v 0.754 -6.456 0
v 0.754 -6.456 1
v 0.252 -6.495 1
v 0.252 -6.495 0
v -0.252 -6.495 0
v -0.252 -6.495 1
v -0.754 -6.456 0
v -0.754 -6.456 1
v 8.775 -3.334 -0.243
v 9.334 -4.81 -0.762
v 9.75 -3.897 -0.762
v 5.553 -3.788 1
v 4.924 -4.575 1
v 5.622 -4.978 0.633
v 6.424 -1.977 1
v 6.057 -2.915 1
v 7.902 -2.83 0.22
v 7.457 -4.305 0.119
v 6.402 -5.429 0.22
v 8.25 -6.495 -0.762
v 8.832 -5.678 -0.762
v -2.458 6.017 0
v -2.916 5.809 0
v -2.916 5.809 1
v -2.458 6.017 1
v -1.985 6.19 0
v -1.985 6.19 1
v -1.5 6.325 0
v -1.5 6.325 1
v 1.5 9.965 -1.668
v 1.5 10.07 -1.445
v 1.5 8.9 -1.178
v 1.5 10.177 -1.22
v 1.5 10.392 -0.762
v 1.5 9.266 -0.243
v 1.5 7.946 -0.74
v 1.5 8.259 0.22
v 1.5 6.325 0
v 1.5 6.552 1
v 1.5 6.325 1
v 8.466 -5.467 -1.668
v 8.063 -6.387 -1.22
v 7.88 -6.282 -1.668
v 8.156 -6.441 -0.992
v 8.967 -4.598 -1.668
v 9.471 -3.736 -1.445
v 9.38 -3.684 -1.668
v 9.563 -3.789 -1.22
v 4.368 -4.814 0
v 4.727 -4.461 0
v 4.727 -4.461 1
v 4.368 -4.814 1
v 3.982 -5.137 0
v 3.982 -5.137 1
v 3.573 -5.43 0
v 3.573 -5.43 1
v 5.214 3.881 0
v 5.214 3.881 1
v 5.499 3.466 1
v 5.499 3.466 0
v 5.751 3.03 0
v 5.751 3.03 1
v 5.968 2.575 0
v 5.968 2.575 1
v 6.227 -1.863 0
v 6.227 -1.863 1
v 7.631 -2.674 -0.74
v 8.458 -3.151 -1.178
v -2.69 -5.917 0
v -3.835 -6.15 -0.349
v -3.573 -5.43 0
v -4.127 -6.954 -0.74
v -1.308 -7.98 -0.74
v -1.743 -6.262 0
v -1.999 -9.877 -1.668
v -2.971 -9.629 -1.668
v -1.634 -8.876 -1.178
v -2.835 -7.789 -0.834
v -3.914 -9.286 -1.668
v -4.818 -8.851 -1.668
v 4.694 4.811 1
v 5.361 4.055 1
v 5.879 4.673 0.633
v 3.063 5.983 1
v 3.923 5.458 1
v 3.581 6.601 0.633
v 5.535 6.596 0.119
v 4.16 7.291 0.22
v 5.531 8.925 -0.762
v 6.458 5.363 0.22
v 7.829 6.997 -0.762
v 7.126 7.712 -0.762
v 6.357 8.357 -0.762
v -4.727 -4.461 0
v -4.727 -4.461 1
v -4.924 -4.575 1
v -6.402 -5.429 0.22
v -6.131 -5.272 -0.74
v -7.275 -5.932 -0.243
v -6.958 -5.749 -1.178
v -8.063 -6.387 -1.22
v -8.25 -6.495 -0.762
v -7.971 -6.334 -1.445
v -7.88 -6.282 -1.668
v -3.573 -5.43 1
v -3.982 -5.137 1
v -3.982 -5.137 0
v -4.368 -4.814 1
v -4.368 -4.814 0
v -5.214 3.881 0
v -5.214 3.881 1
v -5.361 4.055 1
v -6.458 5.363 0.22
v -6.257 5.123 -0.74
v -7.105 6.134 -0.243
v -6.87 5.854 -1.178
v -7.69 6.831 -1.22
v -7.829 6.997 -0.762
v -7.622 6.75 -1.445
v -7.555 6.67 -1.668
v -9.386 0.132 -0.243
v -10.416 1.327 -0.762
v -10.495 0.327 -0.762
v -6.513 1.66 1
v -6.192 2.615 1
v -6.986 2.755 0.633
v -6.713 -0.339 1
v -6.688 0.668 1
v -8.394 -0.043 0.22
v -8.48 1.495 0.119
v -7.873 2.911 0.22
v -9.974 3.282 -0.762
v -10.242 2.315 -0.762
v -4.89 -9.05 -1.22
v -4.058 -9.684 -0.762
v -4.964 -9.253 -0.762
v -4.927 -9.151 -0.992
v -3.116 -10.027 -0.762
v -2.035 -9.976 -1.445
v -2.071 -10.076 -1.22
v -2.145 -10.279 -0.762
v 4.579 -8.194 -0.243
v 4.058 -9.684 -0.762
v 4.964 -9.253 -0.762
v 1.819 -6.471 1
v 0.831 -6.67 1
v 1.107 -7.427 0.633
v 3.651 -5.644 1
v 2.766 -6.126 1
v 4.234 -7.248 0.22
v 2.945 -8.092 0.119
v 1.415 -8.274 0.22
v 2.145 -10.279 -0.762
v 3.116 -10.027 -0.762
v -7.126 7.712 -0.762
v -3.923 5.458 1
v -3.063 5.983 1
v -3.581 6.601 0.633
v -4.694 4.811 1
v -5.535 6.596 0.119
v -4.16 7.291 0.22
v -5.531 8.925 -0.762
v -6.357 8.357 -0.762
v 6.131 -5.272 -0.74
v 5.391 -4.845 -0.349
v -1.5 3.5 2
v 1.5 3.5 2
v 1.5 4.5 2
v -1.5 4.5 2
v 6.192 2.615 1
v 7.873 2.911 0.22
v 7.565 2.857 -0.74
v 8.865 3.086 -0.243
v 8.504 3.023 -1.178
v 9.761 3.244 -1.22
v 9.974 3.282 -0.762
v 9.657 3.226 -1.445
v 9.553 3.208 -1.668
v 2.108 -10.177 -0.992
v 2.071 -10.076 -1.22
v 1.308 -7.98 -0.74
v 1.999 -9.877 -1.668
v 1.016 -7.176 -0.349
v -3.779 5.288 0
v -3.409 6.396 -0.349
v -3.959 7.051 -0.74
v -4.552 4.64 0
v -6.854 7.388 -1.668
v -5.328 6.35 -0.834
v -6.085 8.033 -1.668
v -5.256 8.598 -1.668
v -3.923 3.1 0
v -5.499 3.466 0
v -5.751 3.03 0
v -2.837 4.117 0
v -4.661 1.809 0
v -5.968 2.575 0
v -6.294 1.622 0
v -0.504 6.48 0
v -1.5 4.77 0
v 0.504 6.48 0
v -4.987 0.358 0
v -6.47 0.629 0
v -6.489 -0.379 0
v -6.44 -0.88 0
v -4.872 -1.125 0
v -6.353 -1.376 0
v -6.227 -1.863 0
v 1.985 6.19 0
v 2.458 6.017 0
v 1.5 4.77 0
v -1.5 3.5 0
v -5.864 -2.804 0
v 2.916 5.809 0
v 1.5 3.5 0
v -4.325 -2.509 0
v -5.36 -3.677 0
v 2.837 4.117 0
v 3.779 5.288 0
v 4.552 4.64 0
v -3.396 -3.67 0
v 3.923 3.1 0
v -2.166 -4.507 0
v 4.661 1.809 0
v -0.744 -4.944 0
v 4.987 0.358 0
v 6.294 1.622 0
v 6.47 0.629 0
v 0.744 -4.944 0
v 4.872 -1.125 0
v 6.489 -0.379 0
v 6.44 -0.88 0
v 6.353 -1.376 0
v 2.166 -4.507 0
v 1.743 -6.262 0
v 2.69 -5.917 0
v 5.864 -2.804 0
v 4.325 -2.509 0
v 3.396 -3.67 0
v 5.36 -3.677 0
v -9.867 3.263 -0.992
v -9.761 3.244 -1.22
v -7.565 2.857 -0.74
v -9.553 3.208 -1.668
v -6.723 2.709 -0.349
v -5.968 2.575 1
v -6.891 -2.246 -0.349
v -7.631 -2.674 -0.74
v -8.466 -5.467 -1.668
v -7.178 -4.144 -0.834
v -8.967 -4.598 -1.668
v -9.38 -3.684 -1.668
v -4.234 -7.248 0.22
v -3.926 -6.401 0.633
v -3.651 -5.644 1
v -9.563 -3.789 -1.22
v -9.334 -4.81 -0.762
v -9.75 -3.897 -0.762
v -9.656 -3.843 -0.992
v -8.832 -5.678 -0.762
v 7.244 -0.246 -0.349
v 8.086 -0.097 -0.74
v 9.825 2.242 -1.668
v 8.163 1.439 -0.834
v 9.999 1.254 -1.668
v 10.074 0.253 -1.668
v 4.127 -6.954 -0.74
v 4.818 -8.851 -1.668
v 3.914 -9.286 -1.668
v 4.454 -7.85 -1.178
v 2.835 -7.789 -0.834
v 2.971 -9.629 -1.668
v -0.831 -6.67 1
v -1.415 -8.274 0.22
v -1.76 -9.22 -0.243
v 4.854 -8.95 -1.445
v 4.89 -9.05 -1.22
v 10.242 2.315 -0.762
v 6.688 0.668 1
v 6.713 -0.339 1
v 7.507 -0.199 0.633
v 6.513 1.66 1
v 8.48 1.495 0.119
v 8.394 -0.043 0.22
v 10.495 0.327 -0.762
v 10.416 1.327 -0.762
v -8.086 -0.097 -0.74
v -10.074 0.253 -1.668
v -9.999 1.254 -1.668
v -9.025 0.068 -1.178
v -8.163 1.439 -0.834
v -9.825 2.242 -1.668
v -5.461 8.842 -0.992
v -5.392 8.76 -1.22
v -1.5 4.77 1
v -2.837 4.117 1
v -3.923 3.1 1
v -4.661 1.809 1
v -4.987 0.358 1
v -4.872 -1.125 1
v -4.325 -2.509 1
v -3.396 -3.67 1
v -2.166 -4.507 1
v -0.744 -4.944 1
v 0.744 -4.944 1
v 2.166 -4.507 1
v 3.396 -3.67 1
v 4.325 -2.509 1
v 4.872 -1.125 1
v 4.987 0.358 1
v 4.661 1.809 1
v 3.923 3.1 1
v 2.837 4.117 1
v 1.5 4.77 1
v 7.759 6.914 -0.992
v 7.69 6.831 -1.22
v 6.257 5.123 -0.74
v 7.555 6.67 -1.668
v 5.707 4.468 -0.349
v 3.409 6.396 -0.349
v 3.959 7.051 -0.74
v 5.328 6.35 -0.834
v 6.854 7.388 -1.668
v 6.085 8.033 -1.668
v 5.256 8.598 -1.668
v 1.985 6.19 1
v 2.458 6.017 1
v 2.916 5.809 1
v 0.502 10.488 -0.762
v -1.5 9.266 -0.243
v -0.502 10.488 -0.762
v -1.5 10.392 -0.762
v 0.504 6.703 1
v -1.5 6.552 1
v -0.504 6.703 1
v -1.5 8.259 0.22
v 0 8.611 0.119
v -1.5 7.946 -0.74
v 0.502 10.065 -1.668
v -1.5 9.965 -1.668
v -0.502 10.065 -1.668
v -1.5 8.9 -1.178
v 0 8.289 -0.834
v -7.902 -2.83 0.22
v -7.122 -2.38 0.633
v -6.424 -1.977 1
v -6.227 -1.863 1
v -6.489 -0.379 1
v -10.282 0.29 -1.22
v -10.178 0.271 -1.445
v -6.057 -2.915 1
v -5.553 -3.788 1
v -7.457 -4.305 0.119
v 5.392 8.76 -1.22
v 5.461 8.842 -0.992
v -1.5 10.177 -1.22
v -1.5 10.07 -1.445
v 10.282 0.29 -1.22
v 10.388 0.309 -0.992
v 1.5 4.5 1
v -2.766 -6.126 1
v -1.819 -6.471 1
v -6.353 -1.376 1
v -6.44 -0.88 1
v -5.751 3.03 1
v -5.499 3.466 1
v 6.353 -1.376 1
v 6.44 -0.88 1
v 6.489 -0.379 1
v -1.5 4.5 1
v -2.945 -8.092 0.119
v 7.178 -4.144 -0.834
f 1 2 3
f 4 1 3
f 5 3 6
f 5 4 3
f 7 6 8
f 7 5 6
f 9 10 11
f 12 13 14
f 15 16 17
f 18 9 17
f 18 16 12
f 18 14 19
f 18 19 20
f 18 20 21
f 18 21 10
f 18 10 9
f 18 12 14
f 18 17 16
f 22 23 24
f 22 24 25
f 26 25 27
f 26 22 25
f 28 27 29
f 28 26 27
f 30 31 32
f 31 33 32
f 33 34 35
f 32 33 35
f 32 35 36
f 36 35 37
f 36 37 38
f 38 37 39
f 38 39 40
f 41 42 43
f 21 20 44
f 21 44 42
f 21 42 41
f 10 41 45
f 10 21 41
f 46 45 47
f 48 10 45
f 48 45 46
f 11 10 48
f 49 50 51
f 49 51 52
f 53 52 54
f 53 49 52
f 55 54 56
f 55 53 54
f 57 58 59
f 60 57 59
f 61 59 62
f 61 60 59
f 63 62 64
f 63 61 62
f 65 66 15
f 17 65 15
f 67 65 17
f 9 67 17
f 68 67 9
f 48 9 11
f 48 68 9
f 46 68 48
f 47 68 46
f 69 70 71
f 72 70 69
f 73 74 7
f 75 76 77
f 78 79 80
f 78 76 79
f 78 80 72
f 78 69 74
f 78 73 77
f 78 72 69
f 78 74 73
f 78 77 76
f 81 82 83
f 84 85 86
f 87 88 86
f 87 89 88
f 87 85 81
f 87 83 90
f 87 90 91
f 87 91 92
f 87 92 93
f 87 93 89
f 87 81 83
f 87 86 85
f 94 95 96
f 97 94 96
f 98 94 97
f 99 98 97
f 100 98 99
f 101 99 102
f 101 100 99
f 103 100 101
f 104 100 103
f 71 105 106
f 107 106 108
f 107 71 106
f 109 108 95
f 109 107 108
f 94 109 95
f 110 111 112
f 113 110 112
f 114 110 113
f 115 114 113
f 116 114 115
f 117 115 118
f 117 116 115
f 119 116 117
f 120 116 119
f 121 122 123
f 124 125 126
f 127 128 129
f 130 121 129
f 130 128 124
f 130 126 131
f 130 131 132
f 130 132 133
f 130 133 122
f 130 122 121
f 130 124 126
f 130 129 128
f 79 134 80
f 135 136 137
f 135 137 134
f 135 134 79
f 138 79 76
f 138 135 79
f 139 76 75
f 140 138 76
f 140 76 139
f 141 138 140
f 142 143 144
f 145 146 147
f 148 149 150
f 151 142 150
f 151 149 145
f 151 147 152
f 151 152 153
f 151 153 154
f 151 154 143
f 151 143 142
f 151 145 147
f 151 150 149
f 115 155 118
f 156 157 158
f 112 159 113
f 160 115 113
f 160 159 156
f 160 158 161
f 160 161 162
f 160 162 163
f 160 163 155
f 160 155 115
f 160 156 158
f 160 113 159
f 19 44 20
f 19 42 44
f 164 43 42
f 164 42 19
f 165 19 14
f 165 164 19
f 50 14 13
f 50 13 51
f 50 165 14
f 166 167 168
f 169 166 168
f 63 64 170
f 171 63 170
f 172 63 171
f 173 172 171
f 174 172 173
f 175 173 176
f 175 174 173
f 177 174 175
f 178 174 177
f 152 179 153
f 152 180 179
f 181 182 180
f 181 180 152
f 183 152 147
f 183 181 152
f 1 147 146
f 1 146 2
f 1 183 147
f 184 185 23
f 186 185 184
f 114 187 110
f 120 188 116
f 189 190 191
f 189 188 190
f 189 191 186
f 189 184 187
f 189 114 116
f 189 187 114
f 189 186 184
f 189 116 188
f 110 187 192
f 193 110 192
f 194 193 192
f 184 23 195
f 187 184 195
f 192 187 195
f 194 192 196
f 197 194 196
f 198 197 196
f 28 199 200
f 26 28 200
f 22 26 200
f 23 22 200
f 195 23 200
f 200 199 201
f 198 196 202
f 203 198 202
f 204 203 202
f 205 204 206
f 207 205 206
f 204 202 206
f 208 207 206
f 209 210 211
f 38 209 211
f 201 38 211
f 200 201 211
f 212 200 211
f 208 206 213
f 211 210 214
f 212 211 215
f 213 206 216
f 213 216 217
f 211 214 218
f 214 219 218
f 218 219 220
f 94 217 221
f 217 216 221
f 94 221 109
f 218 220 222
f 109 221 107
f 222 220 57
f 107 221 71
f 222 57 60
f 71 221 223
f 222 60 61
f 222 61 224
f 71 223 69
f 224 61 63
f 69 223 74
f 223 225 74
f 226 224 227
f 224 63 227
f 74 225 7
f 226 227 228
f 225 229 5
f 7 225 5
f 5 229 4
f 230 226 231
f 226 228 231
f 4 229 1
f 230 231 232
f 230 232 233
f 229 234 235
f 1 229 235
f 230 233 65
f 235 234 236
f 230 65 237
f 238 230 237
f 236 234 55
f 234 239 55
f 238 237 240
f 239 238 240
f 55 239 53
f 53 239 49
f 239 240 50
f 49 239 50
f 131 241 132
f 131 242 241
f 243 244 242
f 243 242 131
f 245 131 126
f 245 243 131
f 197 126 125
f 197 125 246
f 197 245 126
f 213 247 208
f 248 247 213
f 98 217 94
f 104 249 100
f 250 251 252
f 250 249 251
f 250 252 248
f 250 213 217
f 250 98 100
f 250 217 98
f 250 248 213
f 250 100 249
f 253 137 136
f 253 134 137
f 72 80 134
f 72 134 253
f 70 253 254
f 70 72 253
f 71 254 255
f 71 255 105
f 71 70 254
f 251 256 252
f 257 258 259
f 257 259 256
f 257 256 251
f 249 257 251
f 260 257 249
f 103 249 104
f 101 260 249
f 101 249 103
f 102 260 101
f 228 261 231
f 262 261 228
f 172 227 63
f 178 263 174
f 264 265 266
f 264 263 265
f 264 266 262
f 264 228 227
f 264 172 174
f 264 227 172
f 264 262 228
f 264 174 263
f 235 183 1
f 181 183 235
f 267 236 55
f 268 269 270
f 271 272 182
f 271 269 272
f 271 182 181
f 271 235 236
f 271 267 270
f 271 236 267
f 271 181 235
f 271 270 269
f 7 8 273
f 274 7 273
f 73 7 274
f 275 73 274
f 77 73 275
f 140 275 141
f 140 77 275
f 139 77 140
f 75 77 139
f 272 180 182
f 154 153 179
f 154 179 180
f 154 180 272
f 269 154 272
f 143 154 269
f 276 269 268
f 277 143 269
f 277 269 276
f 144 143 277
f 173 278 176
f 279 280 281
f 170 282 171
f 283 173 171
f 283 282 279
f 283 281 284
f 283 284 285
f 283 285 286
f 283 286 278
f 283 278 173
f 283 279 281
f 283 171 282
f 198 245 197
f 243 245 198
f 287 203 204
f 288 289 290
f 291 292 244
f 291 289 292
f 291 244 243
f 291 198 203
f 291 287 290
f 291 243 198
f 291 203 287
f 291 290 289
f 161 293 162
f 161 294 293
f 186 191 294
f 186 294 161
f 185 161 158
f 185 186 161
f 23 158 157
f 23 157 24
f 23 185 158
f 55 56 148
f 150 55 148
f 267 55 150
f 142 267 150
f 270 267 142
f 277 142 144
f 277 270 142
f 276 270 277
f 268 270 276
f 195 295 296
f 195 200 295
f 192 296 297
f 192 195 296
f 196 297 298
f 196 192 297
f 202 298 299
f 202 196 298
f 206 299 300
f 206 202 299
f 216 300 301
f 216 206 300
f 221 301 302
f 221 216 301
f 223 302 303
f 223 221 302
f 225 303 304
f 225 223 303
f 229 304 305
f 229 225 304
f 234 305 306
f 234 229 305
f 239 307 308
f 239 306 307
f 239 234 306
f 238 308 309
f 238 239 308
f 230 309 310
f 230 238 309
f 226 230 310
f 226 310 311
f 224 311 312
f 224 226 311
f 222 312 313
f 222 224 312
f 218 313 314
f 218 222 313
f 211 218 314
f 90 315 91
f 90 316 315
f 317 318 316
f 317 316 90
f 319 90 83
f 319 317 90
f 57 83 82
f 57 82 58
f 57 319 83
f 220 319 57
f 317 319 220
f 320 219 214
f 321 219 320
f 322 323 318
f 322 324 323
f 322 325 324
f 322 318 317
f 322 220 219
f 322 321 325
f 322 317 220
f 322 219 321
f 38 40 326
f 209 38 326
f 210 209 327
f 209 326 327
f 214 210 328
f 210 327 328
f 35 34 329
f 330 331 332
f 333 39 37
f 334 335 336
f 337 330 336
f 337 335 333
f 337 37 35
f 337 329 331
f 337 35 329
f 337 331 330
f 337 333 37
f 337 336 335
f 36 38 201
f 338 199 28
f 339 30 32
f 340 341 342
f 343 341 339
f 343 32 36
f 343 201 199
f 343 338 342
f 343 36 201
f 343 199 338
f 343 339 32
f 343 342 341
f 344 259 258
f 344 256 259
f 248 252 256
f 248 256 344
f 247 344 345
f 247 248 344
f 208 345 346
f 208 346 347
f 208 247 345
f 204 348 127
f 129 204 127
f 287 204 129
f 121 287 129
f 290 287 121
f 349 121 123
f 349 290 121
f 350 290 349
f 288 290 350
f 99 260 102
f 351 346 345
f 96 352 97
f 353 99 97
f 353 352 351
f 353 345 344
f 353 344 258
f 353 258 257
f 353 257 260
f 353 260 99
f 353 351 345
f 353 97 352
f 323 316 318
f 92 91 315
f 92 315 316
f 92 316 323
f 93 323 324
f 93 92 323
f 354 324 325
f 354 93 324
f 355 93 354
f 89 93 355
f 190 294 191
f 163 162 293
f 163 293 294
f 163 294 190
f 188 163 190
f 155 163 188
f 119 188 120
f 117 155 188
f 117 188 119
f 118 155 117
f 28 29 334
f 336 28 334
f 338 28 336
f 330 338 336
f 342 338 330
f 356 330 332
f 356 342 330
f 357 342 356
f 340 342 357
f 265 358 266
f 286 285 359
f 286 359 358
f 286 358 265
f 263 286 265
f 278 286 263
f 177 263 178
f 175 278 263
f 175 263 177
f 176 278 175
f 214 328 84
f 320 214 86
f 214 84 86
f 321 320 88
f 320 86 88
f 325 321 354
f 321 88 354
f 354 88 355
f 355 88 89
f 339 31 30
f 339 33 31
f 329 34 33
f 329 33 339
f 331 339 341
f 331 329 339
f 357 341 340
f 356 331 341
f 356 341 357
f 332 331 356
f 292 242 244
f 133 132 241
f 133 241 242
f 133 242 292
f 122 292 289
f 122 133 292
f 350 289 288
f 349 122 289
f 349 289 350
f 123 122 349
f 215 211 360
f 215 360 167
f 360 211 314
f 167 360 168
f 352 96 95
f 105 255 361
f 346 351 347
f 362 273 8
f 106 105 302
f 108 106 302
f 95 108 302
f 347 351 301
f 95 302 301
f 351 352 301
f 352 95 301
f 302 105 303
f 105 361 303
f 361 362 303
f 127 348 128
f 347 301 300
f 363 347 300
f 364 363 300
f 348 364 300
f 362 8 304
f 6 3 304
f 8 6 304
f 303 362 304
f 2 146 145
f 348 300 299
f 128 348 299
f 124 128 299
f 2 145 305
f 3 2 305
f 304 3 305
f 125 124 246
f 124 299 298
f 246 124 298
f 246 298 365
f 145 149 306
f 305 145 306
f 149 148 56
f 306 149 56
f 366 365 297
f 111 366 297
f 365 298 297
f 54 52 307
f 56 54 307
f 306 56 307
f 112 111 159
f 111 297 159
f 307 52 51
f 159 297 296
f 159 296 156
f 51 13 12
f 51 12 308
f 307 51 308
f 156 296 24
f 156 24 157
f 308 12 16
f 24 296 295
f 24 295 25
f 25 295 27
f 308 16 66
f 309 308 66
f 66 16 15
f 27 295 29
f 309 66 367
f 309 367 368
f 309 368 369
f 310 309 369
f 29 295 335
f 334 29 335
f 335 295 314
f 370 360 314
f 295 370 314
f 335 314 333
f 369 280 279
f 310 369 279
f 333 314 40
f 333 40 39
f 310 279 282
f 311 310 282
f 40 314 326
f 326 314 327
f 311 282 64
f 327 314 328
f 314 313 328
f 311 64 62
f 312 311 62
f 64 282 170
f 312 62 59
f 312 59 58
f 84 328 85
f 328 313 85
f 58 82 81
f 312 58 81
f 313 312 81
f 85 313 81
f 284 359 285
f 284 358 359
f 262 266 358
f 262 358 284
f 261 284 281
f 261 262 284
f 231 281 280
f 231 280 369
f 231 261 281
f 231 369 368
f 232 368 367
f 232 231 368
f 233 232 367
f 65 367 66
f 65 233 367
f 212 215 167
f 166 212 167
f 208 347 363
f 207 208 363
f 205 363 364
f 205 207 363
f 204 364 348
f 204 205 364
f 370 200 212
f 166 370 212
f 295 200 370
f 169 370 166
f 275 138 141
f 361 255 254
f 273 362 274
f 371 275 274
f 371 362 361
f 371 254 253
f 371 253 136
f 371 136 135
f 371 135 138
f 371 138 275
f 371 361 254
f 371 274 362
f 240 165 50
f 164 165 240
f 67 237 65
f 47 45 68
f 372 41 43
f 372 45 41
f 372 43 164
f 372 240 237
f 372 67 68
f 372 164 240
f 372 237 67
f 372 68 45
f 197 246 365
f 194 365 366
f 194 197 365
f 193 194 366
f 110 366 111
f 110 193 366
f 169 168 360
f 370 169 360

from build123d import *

# Parameters (mm, degrees)
CUT_EXTRUDE1_DEPTH  = 15.942649011
CIRPATTERN1_COUNT   = 9
BOSS_EXTRUDE1_DEPTH = 1.5


with BuildPart() as part:
    # Sketch1 → Revolve1 (revolve)
    with BuildSketch(Plane(origin=(0, 0, 0), x_dir=(0, 0, -1), z_dir=(1, 0, 0))):
        Polygon((0.761852714, 10.5), (-1, 6.721694663), (-1, 5), (0, 5), (0, 6.5), (1.668160501, 10.077381738), align=None)
    revolve(axis=Axis((0, 0, 0), (0, 0, 1)))

    # Sketch2 → Cut-Extrude1 (cut, symmetric)
    with BuildSketch(Plane.XY):
        with BuildLine():
            Line((1.5, 10.392304845), (1.5, 6.32455532))
            ThreePointArc((1.5, 6.32455532), (2.223130932, 6.108002035), (2.916279132, 5.809071873))
            Line((2.916279132, 5.809071873), (5.530978126, 8.925148793))
            ThreePointArc((5.530978126, 8.925148793), (3.591211505, 9.866772518), (1.5, 10.392304845))
        make_face()
    cut_extrude1 = extrude(amount=CUT_EXTRUDE1_DEPTH, both=True, mode=Mode.SUBTRACT)

    # CirPattern1: Cut-Extrude1 ×9 about axis
    cirpattern1_axis = Axis((0, 0, -1.801568526), (0, 0, 1))
    for i in range(1, CIRPATTERN1_COUNT):
        add(cut_extrude1.rotate(cirpattern1_axis, i * 360 / CIRPATTERN1_COUNT), mode=Mode.SUBTRACT)

    # Sketch3 → Boss-Extrude1 (add, symmetric)
    with BuildSketch(Plane(origin=(0, 0, 0), x_dir=(0, 0, -1), z_dir=(1, 0, 0))):
        Polygon((-2, 4.5), (-1, 4.5), (-1, 5), (0, 5), (0, 3.5), (-2, 3.5), align=None)
    extrude(amount=BOSS_EXTRUDE1_DEPTH, both=True)


solid = part.part
